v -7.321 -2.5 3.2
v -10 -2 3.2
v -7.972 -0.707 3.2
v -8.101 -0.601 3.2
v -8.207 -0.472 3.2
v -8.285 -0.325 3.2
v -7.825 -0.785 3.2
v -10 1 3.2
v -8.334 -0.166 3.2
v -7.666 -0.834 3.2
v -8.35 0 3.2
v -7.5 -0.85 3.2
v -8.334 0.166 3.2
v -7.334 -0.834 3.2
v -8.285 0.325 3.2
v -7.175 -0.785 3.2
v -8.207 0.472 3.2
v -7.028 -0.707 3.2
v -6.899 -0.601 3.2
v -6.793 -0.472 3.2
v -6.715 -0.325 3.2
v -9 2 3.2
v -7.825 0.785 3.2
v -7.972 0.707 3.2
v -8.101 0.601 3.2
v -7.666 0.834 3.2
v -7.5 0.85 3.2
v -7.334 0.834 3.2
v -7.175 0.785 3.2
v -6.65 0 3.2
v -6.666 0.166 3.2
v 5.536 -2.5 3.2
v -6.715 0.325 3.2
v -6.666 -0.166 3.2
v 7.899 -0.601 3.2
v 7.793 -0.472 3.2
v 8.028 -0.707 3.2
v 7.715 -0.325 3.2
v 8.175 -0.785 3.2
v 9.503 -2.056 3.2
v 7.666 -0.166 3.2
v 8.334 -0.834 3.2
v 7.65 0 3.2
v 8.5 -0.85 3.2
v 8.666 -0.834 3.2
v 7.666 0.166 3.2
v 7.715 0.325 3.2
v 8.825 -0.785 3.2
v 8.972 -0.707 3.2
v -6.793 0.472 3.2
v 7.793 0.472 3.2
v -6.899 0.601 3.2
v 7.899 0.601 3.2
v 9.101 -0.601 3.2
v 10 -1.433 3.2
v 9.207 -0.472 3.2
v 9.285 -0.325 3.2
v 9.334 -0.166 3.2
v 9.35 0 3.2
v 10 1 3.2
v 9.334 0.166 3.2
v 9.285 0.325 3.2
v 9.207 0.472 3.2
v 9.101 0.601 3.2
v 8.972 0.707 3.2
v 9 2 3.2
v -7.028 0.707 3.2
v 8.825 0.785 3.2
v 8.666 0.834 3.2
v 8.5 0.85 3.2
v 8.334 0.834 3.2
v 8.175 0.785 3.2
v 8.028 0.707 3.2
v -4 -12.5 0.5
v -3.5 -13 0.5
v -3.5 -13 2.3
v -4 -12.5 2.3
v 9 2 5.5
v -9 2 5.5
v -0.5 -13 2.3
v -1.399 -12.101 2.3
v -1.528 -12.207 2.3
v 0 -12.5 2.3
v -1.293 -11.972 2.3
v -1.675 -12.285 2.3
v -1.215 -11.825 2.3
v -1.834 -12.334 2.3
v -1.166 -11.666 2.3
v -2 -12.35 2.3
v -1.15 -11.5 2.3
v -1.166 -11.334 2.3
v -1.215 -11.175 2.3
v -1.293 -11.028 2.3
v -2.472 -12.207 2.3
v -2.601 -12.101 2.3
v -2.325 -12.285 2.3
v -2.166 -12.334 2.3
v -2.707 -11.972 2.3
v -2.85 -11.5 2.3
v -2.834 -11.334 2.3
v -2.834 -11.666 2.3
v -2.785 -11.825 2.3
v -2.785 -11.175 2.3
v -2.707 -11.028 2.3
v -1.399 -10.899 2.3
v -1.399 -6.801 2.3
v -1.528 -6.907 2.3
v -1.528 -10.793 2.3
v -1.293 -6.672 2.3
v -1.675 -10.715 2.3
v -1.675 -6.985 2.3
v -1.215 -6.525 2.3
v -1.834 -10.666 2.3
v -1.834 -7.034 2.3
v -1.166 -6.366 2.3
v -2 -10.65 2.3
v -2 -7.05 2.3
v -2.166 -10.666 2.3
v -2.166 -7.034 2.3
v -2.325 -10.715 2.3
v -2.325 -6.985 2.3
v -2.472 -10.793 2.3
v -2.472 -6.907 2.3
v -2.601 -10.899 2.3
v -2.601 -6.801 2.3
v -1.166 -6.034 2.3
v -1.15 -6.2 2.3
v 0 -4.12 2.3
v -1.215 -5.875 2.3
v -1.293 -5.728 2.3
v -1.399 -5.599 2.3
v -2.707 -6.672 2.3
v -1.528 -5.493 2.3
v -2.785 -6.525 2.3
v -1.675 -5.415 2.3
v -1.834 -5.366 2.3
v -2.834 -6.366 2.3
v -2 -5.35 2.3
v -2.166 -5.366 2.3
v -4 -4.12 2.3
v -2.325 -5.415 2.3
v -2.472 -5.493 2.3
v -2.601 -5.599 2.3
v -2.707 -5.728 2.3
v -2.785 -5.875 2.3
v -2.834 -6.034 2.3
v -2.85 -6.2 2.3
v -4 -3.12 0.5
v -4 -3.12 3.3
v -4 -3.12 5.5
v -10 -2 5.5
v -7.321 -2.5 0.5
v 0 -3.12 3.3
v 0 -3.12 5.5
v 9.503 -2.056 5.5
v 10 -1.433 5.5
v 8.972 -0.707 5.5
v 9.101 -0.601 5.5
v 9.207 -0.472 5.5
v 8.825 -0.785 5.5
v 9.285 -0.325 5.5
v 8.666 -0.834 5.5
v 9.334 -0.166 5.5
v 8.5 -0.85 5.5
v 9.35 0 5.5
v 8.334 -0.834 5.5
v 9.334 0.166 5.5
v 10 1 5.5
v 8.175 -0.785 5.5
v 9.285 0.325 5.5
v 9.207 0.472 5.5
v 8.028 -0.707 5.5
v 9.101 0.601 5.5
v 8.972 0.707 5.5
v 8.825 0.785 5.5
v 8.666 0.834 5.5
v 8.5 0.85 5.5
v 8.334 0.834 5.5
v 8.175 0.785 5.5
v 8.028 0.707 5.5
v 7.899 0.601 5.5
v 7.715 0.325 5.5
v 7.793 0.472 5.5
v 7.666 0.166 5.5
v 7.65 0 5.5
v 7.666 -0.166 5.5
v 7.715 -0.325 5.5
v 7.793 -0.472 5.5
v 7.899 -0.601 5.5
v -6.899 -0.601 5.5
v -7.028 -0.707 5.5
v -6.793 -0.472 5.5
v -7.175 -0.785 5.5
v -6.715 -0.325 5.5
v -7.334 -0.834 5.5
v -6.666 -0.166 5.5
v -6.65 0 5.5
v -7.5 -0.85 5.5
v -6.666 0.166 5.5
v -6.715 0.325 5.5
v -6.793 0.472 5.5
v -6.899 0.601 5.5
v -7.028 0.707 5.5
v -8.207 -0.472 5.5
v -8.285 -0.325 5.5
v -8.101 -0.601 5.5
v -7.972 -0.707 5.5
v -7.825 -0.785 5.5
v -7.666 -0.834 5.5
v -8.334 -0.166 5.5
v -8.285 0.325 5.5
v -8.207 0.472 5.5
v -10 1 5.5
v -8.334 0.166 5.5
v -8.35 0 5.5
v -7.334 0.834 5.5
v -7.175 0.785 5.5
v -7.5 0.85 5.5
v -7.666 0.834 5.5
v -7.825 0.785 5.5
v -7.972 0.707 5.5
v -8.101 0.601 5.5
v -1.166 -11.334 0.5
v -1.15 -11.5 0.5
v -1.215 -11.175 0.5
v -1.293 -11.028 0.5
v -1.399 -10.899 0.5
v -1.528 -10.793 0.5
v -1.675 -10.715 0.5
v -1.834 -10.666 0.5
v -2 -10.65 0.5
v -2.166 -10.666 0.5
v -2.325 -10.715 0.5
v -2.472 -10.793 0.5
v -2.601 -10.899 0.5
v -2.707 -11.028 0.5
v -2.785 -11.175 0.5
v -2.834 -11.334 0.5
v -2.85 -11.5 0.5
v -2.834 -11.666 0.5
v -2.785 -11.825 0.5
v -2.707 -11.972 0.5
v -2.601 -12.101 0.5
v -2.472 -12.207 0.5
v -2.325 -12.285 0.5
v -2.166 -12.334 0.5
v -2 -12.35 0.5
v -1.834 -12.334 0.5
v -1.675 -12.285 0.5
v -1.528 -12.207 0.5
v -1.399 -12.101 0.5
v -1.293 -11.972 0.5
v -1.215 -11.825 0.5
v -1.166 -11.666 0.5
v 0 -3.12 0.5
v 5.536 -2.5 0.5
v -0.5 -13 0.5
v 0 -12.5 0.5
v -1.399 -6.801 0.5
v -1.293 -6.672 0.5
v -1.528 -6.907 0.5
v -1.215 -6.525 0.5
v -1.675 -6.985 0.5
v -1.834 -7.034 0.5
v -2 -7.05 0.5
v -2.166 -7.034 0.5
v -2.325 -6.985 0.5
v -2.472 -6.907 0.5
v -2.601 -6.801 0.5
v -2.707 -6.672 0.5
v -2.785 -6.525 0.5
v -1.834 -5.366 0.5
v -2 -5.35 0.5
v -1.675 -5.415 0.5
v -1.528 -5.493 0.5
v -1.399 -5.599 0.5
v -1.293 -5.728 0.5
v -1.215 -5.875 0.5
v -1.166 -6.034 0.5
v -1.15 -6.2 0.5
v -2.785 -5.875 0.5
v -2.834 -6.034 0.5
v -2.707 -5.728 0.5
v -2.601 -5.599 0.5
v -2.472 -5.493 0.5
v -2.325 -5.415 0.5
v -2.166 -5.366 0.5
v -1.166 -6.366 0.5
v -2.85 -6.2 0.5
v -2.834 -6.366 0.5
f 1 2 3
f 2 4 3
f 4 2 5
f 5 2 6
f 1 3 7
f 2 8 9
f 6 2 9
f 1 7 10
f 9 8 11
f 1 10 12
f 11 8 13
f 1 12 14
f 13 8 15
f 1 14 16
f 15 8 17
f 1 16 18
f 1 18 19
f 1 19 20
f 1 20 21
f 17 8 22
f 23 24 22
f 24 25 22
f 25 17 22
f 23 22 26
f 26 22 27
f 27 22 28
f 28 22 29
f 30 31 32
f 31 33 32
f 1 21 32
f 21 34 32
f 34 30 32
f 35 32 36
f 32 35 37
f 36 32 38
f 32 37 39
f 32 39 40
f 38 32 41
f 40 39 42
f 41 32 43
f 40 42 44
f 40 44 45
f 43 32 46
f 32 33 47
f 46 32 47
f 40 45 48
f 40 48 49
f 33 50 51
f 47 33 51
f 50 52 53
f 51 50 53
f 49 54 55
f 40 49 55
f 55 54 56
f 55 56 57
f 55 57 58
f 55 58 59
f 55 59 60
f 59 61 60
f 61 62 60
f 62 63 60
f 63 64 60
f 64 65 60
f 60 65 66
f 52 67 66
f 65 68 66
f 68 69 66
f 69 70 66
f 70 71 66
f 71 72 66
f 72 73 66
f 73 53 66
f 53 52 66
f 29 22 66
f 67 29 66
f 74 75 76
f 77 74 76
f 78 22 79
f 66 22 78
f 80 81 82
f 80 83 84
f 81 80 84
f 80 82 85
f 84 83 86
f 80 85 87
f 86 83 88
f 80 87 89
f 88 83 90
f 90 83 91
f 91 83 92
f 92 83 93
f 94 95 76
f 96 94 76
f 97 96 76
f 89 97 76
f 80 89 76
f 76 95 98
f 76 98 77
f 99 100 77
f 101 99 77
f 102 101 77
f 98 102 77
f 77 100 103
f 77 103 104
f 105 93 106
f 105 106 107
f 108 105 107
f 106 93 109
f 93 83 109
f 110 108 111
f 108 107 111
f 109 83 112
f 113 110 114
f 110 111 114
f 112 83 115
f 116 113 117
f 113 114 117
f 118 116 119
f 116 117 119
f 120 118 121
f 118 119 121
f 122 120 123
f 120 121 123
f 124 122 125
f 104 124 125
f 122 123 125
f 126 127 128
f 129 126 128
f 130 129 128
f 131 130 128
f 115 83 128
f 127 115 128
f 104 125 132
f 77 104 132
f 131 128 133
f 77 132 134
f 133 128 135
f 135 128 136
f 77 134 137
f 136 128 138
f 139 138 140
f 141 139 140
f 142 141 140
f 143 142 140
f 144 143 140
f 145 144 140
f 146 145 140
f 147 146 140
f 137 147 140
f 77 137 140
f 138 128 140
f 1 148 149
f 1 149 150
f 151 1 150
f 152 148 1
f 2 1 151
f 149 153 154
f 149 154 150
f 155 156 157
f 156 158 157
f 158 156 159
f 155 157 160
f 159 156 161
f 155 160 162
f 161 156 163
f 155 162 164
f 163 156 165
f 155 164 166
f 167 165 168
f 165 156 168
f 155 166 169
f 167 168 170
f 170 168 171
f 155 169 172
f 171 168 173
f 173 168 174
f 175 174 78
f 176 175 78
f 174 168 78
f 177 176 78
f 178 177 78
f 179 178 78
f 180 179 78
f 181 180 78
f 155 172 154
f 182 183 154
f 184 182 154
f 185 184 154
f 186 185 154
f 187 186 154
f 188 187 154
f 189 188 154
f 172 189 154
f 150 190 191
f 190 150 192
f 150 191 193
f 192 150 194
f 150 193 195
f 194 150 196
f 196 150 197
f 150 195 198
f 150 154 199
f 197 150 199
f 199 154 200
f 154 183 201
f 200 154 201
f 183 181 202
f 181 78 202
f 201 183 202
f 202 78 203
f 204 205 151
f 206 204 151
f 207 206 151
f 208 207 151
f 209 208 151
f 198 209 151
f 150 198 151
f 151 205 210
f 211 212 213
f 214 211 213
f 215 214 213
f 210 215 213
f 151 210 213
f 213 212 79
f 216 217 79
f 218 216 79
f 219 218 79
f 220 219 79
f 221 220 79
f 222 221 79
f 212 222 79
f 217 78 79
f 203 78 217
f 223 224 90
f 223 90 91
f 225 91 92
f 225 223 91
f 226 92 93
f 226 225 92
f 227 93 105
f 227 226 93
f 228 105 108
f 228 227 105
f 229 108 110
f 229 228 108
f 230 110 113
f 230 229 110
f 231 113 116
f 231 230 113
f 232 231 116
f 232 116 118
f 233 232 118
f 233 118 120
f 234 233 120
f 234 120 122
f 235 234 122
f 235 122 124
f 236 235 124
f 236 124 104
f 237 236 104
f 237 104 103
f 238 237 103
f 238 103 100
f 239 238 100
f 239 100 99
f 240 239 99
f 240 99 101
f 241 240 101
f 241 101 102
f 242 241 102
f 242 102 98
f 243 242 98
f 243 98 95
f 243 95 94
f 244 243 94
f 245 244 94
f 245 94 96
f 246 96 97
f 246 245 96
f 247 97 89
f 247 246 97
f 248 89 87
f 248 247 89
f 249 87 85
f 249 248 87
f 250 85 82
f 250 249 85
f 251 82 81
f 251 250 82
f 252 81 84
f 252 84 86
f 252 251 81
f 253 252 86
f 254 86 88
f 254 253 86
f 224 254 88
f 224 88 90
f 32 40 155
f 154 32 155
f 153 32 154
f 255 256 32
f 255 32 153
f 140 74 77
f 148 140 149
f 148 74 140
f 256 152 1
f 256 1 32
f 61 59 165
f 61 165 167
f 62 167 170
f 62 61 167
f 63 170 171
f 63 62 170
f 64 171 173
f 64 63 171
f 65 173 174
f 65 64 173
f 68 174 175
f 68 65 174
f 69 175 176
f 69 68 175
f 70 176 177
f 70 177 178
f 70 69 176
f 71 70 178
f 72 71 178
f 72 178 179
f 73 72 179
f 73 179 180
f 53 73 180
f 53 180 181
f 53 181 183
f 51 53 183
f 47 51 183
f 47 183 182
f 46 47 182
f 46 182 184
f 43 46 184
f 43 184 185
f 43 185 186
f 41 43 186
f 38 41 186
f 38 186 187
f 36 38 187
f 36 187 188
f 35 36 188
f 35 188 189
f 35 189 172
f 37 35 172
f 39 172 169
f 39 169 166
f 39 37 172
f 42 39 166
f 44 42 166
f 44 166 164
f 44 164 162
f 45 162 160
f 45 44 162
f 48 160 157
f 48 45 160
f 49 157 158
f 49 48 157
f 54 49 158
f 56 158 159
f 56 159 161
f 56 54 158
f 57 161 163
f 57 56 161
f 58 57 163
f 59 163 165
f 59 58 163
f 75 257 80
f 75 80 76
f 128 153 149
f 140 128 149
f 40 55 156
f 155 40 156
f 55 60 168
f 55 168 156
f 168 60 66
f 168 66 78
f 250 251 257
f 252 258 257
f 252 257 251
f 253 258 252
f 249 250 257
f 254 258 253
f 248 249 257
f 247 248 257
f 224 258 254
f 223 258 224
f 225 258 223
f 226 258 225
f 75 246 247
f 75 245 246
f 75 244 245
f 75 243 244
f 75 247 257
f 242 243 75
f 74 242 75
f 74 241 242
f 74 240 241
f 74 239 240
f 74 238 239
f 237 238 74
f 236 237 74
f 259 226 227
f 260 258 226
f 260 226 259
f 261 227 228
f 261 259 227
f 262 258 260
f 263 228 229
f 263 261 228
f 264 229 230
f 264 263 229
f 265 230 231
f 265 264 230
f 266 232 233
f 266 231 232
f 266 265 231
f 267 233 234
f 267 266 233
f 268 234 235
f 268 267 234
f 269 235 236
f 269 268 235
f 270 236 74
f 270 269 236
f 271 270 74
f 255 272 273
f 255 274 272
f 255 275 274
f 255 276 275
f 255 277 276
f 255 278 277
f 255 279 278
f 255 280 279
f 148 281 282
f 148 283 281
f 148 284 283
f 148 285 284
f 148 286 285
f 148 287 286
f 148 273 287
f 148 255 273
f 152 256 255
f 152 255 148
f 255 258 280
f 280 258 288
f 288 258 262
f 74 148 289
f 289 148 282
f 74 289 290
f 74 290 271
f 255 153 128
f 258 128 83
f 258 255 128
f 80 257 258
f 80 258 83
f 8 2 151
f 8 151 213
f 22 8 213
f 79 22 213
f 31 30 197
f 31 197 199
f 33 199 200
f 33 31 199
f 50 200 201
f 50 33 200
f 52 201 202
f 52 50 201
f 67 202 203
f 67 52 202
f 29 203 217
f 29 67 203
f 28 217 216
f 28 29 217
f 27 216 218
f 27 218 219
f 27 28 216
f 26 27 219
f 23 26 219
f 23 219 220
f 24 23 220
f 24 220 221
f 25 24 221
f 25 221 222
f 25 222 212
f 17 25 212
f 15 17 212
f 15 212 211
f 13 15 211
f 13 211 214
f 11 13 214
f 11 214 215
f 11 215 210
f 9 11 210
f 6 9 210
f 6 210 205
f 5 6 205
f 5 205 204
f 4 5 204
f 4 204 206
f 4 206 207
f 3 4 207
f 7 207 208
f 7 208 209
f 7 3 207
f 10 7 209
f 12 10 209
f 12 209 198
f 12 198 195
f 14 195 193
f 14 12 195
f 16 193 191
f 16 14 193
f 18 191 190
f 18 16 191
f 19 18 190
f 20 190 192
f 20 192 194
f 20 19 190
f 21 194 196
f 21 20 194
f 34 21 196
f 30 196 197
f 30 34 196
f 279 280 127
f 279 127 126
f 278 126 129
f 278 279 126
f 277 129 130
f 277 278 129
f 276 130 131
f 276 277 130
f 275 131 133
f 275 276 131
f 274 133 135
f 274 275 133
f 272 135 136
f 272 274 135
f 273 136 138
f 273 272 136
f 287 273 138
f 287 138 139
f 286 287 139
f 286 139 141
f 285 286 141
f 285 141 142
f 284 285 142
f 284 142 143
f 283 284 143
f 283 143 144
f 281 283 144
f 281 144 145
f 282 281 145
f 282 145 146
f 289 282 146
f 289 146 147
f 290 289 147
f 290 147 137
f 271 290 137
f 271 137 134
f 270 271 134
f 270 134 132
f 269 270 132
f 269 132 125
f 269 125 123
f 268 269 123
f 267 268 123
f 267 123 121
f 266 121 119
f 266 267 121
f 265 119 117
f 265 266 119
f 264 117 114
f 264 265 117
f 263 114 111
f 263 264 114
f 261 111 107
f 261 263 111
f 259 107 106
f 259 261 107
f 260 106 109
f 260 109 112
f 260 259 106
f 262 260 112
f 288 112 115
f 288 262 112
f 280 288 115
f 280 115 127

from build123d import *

# Parameters (mm, degrees)
SKETCH_1_R          = 0.85
EXTRUDE_2_DEPTH     = 5.5
CUT_EXTRUDE_START   = 3.2
SKETCH_3_W          = 4
SKETCH_3_H          = 9.88
SKETCH_3_R          = 0.85
CUT_EXTRUDE_2_DEPTH = 3.2
CHAMFER_1_SIZE      = 1
CHAMFER_2_SIZE      = 1
CHAMFER_3_SIZE      = 0.5
SKETCH_4_R          = 0.85
CUT_EXTRUDE_3_DEPTH = 3.2
CHAMFER_4_SIZE      = 0.5
CHAMFER_4_SIZE2     = 0.566583589
CUT_EXTRUDE_4_DEPTH = 0.5


with BuildPart() as part:
    # 草图1 → 凸台-拉伸2 (new body)
    with BuildSketch(Plane.XY):
        Polygon((-10, 2), (10, 2), (10, -2), (0, -3.12), (0, -13), (-4, -13), (-4, -3.12), (-10, -2), align=None)
        with Locations((-7.5, 0)):
            Circle(SKETCH_1_R, mode=Mode.SUBTRACT)
        with Locations((8.5, 0)):
            Circle(SKETCH_1_R, mode=Mode.SUBTRACT)
        with Locations((-2, -11.5)):
            Circle(SKETCH_1_R, mode=Mode.SUBTRACT)
        with Locations((-2, -6.2)):
            Circle(SKETCH_1_R, mode=Mode.SUBTRACT)
    extrude(amount=EXTRUDE_2_DEPTH)

    # 草图3 → 切除-拉伸2 (cut)
    with BuildSketch(Plane(origin=(0, 0, 5.5), x_dir=(-1, 0, 0), z_dir=(0, 0, -1)).offset(CUT_EXTRUDE_START)):
        with Locations((2, -8.06)):
            Rectangle(SKETCH_3_W, SKETCH_3_H)
        with Locations((2, -11.5)):
            Circle(SKETCH_3_R, mode=Mode.SUBTRACT)
        with Locations((2, -6.2)):
            Circle(SKETCH_3_R, mode=Mode.SUBTRACT)
    extrude(amount=-CUT_EXTRUDE_2_DEPTH, mode=Mode.SUBTRACT)

    # 倒角1
    chamfer_1_edges = [part.edges().sort_by_distance(p)[0] for p in [
        (-2, -3.12, 2.3),
    ]]
    chamfer(chamfer_1_edges, length=CHAMFER_1_SIZE)

    # 倒角2
    chamfer_2_edges = [part.edges().sort_by_distance(p)[0] for p in [
        (-10, 2, 2.75),
        (10, 2, 2.75),
    ]]
    chamfer(chamfer_2_edges, length=CHAMFER_2_SIZE)

    # 倒角3
    chamfer_3_edges = [part.edges().sort_by_distance(p)[0] for p in [
        (0, -13, 1.15),
        (-4, -13, 1.15),
    ]]
    chamfer(chamfer_3_edges, length=CHAMFER_3_SIZE)

    # 草图4 → 切除-拉伸3 (cut)
    with BuildSketch(Plane.XY):
        Polygon((-10, -2.5), (10, -2.5), (10, 1), (9, 2), (-9, 2), (-10, 1), align=None)
        with Locations((8.5, 0)):
            Circle(SKETCH_4_R, mode=Mode.SUBTRACT)
        with Locations((-7.5, 0)):
            Circle(SKETCH_4_R, mode=Mode.SUBTRACT)
    extrude(amount=CUT_EXTRUDE_3_DEPTH, mode=Mode.SUBTRACT)

    # 倒角4
    chamfer_4_edges = [part.edges().sort_by_distance(p)[0] for p in [
        (10, -2, 4.35),
    ]]
    chamfer_4_side = [part.faces().sort_by_distance(p)[0] for p in [
        (4.028822055, -2.66877193, 3.153508772),
    ]]
    chamfer(chamfer_4_edges, length=CHAMFER_4_SIZE, length2=CHAMFER_4_SIZE2, reference=chamfer_4_side[0])

    # 草图5 → 切除-拉伸4 (cut)
    with BuildSketch(Plane(origin=(0, 0, 0), x_dir=(-1, 0, 0), z_dir=(0, 0, -1))):
        Polygon((4, -3.12), (7.321428571, -2.5), (-5.535714286, -2.5), (0, -3.12), (0, -12.5), (0.5, -13), (3.5, -13), (4, -12.5), align=None)
    extrude(amount=-CUT_EXTRUDE_4_DEPTH, mode=Mode.SUBTRACT)


solid = part.part
